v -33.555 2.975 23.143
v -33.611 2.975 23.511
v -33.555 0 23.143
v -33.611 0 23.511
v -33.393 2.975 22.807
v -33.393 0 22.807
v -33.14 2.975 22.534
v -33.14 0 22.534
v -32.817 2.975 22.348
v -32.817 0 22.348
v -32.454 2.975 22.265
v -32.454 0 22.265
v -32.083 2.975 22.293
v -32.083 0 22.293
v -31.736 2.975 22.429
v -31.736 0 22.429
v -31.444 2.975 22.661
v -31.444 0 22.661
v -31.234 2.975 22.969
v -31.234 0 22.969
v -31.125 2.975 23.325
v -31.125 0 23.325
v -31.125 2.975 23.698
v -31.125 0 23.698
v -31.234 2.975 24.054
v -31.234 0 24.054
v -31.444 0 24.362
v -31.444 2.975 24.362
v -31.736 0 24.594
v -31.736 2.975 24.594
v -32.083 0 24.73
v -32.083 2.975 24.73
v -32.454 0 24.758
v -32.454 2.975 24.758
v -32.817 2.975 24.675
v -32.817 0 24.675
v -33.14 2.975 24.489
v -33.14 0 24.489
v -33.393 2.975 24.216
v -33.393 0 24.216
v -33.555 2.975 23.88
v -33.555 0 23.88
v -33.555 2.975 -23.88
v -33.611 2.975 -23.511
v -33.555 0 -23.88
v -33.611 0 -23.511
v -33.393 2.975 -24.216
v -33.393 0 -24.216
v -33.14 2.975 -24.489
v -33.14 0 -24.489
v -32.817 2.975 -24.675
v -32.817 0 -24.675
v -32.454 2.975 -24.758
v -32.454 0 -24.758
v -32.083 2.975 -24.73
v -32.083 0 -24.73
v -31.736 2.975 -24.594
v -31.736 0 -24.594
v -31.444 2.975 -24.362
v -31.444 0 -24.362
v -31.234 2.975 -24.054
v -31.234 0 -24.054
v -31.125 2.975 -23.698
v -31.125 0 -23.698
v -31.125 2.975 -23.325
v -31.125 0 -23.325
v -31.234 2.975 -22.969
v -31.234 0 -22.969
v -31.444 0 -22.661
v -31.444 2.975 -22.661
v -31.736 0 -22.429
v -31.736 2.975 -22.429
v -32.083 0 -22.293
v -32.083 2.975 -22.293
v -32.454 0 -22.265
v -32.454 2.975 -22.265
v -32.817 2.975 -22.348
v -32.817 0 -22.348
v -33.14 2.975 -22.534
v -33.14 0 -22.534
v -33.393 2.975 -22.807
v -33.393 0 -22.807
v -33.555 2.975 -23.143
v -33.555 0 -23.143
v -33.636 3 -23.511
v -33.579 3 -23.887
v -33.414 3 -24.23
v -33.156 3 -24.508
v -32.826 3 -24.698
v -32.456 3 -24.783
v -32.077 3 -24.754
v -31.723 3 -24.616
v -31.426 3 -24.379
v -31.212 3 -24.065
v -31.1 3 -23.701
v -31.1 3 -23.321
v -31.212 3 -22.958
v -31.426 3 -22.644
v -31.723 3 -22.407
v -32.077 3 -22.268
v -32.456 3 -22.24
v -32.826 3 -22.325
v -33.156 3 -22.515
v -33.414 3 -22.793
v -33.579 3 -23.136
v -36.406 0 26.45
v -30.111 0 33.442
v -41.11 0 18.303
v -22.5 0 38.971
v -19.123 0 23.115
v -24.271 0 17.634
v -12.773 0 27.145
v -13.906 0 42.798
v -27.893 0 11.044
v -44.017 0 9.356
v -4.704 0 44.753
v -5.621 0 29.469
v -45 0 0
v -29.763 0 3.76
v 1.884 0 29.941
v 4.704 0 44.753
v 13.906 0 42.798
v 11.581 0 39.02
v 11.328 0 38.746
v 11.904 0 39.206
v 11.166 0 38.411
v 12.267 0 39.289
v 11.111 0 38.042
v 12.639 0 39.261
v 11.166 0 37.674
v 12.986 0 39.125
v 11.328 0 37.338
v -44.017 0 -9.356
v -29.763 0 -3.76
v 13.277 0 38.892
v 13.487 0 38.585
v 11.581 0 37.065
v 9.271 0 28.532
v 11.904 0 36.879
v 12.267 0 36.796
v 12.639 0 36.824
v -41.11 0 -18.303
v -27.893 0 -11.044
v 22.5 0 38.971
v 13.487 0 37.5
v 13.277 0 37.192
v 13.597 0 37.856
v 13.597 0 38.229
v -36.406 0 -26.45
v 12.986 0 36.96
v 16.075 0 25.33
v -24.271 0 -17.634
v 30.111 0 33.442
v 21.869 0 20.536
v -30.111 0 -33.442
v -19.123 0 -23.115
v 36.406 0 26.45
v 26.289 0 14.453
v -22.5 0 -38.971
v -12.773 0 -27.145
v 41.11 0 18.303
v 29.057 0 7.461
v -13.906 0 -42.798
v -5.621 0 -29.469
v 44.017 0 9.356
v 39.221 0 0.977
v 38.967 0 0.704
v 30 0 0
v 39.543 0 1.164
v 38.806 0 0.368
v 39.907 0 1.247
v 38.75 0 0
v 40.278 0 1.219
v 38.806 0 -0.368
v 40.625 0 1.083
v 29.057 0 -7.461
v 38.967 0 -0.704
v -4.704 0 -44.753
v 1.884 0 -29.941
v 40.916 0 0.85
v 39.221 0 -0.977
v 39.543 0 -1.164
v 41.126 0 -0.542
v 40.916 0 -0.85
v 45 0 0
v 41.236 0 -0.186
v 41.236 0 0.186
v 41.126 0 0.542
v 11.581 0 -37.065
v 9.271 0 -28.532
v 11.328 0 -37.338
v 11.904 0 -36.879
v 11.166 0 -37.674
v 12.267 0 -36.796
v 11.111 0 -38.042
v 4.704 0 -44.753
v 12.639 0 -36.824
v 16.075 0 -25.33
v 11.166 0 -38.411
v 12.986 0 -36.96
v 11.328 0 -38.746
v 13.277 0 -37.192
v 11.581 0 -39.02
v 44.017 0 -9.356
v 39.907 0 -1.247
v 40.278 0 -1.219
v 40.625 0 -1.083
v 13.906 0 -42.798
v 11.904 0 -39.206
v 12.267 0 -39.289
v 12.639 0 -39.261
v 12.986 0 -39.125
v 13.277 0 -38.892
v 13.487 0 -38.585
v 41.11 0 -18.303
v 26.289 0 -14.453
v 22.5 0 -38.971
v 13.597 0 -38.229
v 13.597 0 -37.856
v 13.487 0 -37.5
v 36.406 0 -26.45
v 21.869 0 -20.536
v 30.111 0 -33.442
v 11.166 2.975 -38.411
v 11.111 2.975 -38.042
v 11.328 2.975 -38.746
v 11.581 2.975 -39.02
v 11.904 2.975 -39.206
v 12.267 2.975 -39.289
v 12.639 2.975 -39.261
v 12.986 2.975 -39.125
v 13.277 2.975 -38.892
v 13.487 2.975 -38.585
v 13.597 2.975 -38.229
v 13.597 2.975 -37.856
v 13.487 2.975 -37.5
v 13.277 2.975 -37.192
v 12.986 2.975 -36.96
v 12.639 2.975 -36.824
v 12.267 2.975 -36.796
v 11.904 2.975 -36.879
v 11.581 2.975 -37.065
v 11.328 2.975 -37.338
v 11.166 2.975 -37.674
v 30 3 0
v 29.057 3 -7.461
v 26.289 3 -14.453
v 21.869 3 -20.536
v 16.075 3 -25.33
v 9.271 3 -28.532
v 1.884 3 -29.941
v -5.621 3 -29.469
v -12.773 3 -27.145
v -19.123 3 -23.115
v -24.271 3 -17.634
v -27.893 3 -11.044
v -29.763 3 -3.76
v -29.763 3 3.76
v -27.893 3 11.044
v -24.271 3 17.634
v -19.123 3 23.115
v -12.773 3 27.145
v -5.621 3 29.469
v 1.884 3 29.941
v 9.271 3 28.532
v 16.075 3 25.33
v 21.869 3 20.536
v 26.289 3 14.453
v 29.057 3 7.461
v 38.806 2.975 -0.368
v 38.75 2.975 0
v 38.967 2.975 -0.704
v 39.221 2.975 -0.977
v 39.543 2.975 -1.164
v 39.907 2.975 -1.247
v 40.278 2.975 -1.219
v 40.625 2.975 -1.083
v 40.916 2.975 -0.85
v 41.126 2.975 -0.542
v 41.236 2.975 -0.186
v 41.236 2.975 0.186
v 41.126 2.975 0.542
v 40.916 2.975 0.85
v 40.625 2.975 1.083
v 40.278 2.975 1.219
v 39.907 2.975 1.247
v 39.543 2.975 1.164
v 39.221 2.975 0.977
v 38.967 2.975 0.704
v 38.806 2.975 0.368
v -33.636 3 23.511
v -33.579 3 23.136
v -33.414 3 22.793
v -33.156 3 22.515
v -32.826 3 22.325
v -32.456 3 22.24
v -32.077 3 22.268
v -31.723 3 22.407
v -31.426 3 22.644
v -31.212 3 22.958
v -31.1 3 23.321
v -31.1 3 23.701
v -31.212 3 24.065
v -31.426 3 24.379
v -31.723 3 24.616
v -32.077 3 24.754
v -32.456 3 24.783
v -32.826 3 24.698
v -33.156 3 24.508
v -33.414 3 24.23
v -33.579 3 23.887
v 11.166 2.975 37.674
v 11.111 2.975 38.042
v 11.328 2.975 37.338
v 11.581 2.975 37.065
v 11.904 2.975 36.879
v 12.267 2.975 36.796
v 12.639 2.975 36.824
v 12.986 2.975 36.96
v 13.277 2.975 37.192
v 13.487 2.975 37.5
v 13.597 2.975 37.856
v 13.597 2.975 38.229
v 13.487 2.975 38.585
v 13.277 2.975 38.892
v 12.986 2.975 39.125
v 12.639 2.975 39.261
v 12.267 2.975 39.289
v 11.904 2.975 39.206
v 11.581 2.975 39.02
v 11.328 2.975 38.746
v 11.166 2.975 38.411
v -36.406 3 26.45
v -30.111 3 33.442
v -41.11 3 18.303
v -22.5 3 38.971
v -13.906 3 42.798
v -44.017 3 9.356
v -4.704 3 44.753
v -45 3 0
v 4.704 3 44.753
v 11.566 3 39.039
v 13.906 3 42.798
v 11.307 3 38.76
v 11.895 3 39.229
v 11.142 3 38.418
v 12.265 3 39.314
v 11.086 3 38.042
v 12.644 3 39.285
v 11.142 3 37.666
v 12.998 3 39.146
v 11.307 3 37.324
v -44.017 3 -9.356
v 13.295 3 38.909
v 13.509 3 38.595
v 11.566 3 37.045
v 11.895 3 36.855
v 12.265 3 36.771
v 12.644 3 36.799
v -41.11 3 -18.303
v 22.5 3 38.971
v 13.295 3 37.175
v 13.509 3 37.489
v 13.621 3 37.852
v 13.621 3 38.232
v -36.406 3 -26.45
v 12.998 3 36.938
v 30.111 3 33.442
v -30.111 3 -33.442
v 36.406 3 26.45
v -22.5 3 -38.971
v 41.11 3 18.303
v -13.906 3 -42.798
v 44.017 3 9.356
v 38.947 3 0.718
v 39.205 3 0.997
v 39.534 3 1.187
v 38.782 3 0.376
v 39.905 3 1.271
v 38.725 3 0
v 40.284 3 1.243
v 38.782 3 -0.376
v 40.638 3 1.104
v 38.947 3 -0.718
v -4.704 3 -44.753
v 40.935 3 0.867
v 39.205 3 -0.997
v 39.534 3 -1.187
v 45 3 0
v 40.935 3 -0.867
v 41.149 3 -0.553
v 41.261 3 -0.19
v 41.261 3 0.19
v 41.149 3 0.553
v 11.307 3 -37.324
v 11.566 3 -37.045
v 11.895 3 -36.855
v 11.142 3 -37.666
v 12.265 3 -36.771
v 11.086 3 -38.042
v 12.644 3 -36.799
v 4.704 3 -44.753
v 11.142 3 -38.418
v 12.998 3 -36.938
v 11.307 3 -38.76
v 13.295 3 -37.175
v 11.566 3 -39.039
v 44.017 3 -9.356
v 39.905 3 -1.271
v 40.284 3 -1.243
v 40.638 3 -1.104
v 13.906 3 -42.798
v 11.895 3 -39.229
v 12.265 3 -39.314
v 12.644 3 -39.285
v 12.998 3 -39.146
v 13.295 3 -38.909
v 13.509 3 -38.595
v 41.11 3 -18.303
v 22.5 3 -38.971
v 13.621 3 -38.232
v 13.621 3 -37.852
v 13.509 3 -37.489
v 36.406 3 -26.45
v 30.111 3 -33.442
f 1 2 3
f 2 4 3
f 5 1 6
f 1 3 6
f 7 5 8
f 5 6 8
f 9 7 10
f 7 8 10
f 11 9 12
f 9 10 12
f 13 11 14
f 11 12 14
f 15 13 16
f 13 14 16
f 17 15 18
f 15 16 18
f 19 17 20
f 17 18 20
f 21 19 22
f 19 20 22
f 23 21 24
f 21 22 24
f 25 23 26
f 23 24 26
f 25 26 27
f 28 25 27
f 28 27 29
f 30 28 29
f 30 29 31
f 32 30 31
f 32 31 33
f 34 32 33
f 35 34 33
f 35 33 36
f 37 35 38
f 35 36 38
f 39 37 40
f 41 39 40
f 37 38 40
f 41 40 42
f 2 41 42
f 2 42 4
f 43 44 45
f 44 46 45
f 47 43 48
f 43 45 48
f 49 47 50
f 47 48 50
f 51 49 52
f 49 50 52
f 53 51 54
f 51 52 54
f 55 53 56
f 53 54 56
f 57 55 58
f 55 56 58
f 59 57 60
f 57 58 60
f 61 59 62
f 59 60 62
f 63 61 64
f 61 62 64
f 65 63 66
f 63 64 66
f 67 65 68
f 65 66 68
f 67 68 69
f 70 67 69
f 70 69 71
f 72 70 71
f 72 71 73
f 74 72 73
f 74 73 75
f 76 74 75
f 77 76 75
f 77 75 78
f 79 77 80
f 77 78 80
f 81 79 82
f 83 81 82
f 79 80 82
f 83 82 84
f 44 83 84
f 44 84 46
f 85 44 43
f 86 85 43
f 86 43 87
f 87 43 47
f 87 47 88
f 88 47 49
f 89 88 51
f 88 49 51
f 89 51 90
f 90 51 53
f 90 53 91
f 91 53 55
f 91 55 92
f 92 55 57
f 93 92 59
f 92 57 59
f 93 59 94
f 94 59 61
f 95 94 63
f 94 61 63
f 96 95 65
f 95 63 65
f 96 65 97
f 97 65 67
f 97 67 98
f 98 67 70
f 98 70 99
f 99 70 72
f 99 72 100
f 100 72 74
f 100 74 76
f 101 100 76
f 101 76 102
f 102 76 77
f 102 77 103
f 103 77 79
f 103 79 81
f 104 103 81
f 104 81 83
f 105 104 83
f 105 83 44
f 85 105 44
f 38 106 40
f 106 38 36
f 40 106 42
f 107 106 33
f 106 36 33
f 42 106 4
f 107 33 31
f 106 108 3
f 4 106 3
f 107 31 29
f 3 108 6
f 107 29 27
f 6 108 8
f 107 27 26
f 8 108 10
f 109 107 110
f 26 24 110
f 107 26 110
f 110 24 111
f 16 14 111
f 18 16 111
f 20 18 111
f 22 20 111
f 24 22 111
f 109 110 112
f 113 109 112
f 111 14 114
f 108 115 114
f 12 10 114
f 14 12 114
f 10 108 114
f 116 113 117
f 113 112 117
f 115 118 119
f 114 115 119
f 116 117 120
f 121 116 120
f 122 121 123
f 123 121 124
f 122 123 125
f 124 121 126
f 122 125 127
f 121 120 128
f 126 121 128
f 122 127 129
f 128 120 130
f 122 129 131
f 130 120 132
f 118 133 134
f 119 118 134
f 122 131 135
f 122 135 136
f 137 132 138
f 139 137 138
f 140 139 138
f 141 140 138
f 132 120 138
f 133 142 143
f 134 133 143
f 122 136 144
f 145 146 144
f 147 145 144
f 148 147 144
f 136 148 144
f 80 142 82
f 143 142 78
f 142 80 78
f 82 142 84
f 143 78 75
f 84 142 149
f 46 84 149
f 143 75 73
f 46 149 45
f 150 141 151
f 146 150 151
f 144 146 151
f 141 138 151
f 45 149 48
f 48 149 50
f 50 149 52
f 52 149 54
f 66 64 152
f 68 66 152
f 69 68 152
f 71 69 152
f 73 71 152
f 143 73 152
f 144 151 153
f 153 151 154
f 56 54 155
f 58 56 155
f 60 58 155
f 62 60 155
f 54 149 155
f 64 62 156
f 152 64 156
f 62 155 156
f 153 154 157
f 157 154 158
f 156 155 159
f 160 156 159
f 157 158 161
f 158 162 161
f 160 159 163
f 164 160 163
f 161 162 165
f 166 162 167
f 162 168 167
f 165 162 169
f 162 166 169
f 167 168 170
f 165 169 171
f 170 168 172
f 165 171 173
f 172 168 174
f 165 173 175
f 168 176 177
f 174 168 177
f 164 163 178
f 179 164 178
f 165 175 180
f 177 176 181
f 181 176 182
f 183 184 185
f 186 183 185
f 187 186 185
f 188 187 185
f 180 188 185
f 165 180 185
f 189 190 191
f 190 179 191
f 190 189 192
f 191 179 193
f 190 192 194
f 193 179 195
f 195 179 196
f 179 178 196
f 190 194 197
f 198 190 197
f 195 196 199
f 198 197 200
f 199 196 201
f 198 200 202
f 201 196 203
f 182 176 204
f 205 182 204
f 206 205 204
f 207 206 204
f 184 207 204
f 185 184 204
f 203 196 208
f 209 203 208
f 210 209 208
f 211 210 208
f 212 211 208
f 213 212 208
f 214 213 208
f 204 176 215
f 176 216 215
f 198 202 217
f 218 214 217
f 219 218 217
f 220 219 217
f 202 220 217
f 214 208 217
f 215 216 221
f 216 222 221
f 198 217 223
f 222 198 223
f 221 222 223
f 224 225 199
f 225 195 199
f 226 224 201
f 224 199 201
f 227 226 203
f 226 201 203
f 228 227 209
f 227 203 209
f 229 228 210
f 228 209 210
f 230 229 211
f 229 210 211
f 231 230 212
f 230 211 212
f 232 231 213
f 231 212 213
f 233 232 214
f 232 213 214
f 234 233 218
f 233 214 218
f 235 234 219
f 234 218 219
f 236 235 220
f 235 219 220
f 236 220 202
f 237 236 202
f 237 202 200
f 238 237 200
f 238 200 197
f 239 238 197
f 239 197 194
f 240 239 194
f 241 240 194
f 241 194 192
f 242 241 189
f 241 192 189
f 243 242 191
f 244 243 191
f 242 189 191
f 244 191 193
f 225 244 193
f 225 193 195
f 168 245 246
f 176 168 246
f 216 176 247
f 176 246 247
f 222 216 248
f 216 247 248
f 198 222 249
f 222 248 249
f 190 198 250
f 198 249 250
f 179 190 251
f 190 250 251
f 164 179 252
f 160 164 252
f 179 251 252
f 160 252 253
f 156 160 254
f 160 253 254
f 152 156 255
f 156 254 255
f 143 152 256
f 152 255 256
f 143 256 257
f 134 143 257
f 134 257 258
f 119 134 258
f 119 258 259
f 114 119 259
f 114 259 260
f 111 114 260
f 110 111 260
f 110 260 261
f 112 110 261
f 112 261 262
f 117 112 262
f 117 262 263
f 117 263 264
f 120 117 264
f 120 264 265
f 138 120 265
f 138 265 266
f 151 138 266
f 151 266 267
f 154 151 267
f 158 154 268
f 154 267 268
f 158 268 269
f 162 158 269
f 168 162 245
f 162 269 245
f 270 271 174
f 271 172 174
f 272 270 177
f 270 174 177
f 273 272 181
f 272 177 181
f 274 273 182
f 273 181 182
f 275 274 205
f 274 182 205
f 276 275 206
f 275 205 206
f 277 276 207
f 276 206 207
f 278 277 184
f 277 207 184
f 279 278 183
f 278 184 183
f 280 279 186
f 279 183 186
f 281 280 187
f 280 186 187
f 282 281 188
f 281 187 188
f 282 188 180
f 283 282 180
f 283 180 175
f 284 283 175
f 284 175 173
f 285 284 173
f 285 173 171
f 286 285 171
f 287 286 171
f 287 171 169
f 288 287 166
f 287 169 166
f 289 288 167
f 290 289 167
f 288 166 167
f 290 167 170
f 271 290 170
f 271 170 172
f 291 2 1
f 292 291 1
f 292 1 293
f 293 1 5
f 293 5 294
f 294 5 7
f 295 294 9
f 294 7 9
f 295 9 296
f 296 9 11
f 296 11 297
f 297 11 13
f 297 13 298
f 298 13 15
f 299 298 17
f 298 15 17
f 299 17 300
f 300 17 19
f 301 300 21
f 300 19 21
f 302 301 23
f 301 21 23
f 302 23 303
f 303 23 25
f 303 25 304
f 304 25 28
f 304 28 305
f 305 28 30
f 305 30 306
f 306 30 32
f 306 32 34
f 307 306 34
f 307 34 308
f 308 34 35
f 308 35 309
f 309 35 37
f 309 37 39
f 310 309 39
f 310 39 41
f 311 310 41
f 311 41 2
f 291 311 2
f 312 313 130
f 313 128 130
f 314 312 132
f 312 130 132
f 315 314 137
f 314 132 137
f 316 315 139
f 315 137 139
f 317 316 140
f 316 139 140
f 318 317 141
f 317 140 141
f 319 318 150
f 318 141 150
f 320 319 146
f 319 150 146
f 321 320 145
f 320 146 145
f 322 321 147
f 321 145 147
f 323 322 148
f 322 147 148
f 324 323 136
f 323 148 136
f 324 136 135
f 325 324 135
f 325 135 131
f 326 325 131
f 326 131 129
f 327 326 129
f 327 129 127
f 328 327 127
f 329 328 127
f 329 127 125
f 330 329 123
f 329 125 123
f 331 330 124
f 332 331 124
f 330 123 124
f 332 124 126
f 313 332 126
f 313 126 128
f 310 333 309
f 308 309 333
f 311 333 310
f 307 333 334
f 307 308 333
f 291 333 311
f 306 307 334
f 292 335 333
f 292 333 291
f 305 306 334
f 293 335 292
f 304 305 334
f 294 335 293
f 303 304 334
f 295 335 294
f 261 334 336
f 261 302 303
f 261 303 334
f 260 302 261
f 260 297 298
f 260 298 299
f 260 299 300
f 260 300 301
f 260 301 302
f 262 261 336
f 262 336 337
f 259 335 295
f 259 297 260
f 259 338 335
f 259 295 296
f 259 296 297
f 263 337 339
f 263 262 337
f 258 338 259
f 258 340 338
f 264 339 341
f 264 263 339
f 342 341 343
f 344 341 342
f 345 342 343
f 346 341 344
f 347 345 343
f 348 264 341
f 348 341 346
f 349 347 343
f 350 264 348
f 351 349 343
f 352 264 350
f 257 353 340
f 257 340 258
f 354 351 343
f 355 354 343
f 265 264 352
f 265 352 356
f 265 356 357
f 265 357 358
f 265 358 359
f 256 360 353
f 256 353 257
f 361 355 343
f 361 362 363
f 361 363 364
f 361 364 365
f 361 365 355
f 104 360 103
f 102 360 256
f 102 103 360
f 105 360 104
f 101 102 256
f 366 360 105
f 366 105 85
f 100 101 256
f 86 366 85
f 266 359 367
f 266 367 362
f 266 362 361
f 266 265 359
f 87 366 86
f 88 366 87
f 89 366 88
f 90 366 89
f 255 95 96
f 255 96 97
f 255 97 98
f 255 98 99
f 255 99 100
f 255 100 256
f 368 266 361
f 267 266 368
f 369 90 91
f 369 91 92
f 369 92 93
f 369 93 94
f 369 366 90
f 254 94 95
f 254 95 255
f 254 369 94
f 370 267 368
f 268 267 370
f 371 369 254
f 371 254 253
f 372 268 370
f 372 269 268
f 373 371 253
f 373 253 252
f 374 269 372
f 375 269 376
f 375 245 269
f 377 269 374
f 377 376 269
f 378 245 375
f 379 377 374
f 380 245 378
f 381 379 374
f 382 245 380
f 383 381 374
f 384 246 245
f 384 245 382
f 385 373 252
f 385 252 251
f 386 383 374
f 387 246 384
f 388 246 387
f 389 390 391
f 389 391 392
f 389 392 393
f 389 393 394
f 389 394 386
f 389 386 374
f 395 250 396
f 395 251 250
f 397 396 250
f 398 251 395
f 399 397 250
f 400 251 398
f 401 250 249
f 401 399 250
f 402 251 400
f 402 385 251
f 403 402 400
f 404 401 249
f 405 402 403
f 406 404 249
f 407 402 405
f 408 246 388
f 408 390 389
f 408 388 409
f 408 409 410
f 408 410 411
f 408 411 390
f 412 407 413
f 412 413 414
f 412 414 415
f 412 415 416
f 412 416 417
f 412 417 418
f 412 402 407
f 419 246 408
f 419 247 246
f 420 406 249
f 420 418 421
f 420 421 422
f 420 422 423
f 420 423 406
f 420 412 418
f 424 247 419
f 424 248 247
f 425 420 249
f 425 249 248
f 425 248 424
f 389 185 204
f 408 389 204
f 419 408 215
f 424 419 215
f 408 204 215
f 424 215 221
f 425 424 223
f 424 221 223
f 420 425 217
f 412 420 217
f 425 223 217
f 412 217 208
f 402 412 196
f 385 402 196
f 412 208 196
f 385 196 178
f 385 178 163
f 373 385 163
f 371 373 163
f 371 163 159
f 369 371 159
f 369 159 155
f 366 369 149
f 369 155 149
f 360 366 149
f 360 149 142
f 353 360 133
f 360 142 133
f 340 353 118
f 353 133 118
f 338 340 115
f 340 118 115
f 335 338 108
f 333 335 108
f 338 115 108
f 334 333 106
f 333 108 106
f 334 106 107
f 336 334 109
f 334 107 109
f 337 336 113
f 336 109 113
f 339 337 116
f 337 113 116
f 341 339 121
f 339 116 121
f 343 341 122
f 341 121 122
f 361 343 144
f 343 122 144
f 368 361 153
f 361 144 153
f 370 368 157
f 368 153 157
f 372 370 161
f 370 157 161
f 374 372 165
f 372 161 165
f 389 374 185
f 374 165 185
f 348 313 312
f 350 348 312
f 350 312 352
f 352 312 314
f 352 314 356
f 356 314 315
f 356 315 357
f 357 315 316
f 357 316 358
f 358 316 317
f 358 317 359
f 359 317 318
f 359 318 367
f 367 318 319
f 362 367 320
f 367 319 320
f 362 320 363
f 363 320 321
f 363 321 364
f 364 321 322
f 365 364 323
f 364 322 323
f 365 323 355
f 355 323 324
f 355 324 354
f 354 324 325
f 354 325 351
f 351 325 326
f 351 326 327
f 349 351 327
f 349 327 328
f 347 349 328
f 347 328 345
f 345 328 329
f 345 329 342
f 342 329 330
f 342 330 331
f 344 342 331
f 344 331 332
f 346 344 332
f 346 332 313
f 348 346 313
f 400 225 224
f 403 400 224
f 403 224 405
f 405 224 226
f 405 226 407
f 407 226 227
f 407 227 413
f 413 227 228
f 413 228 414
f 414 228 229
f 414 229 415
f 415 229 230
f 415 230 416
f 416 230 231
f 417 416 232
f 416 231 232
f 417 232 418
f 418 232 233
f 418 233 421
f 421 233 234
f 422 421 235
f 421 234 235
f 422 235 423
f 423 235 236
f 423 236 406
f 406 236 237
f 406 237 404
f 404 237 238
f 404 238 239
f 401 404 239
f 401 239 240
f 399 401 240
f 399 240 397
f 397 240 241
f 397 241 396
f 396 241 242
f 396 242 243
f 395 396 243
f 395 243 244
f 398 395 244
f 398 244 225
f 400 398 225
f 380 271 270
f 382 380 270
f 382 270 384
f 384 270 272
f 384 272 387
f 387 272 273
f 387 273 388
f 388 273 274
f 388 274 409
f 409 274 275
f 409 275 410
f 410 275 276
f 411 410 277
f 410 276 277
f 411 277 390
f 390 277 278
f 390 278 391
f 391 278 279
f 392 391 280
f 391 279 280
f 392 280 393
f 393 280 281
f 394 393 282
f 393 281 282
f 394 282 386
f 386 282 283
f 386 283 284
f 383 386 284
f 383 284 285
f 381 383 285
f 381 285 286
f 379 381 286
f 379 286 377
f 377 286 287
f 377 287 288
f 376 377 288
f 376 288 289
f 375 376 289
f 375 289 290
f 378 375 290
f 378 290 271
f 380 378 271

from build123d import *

# Parameters (mm, degrees)
SKETCH_1_R                   = 45
EXTRUDE_1_DEPTH              = 3
SKETCH_5_R                   = 30
CUT_EXTRUDE_1_DEPTH          = 1
CUT_EXTRUDE_1_DEPTH_BACK     = 4
HOLE_WIZARD_M3_2_D           = 2.5
HOLE_WIZARD_M3_2_CSINK_D     = 2.55
HOLE_WIZARD_M3_2_CSINK_ANGLE = 90


with BuildPart() as part:
    # 草图1 → 凸台-拉伸1 (new body)
    with BuildSketch(Plane(origin=(0, 0, 0), x_dir=(1, 0, 0), z_dir=(0, 1, 0))):
        Circle(SKETCH_1_R)
    extrude(amount=EXTRUDE_1_DEPTH)

    # 草图5 → 切除-拉伸1 (cut, two sides)
    with BuildSketch(Plane(origin=(0, 3, 0), x_dir=(1, 0, 0), z_dir=(0, 1, 0))) as cut_extrude_1_sk:
        Circle(SKETCH_5_R)
    extrude(amount=CUT_EXTRUDE_1_DEPTH, mode=Mode.SUBTRACT)
    extrude(cut_extrude_1_sk.sketch, amount=-CUT_EXTRUDE_1_DEPTH_BACK, mode=Mode.SUBTRACT)

    # M3 螺纹孔的螺纹孔钻头2 (through all)
    with Locations(Plane(origin=(0, 3, 0), x_dir=(1, 0, 0), z_dir=(0, 1, 0))):
        with Locations((0, 0), (40, 0), (12.360679775, -38.042260652), (-32.360679775, -23.511410092), (-32.360679775, 23.511410092), (12.360679775, 38.042260652)):
            CounterSinkHole(HOLE_WIZARD_M3_2_D / 2, HOLE_WIZARD_M3_2_CSINK_D / 2, counter_sink_angle=HOLE_WIZARD_M3_2_CSINK_ANGLE)


solid = part.part
